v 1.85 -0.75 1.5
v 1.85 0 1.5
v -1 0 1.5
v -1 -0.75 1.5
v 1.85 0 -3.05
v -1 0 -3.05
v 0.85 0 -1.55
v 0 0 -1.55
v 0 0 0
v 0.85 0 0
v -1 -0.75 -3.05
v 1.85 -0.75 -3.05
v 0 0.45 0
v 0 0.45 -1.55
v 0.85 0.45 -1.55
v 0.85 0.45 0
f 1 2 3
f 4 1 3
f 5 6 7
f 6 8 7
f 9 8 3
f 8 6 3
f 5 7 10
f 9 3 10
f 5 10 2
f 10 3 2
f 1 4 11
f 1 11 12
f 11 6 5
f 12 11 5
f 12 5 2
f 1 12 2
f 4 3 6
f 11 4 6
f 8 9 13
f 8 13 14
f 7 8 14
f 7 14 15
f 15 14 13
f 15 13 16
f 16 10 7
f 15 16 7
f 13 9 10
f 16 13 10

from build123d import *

# Parameters (mm, degrees)
SKETCH1_W           = 0.85
SKETCH1_H           = 1.55
BOSS_EXTRUDE1_DEPTH = 0.45
BOSS_EXTRUDE2_DEPTH = 0.75


with BuildPart() as part:
    # Sketch1 → Boss-Extrude1 (new body)
    with BuildSketch(Plane(origin=(0, 0, 0), x_dir=(1, 0, 0), z_dir=(0, 1, 0))):
        with Locations((0.425, 0.775)):
            Rectangle(SKETCH1_W, SKETCH1_H)
    extrude(amount=BOSS_EXTRUDE1_DEPTH)

    # Sketch2 → Boss-Extrude2 (add)
    with BuildSketch(Plane.XZ):
        Polygon((0.425, 1.5), (-1, 1.5), (-1, -3.05), (1.85, -3.05), (1.85, 1.5), align=None)
    extrude(amount=BOSS_EXTRUDE2_DEPTH)


solid = part.part
